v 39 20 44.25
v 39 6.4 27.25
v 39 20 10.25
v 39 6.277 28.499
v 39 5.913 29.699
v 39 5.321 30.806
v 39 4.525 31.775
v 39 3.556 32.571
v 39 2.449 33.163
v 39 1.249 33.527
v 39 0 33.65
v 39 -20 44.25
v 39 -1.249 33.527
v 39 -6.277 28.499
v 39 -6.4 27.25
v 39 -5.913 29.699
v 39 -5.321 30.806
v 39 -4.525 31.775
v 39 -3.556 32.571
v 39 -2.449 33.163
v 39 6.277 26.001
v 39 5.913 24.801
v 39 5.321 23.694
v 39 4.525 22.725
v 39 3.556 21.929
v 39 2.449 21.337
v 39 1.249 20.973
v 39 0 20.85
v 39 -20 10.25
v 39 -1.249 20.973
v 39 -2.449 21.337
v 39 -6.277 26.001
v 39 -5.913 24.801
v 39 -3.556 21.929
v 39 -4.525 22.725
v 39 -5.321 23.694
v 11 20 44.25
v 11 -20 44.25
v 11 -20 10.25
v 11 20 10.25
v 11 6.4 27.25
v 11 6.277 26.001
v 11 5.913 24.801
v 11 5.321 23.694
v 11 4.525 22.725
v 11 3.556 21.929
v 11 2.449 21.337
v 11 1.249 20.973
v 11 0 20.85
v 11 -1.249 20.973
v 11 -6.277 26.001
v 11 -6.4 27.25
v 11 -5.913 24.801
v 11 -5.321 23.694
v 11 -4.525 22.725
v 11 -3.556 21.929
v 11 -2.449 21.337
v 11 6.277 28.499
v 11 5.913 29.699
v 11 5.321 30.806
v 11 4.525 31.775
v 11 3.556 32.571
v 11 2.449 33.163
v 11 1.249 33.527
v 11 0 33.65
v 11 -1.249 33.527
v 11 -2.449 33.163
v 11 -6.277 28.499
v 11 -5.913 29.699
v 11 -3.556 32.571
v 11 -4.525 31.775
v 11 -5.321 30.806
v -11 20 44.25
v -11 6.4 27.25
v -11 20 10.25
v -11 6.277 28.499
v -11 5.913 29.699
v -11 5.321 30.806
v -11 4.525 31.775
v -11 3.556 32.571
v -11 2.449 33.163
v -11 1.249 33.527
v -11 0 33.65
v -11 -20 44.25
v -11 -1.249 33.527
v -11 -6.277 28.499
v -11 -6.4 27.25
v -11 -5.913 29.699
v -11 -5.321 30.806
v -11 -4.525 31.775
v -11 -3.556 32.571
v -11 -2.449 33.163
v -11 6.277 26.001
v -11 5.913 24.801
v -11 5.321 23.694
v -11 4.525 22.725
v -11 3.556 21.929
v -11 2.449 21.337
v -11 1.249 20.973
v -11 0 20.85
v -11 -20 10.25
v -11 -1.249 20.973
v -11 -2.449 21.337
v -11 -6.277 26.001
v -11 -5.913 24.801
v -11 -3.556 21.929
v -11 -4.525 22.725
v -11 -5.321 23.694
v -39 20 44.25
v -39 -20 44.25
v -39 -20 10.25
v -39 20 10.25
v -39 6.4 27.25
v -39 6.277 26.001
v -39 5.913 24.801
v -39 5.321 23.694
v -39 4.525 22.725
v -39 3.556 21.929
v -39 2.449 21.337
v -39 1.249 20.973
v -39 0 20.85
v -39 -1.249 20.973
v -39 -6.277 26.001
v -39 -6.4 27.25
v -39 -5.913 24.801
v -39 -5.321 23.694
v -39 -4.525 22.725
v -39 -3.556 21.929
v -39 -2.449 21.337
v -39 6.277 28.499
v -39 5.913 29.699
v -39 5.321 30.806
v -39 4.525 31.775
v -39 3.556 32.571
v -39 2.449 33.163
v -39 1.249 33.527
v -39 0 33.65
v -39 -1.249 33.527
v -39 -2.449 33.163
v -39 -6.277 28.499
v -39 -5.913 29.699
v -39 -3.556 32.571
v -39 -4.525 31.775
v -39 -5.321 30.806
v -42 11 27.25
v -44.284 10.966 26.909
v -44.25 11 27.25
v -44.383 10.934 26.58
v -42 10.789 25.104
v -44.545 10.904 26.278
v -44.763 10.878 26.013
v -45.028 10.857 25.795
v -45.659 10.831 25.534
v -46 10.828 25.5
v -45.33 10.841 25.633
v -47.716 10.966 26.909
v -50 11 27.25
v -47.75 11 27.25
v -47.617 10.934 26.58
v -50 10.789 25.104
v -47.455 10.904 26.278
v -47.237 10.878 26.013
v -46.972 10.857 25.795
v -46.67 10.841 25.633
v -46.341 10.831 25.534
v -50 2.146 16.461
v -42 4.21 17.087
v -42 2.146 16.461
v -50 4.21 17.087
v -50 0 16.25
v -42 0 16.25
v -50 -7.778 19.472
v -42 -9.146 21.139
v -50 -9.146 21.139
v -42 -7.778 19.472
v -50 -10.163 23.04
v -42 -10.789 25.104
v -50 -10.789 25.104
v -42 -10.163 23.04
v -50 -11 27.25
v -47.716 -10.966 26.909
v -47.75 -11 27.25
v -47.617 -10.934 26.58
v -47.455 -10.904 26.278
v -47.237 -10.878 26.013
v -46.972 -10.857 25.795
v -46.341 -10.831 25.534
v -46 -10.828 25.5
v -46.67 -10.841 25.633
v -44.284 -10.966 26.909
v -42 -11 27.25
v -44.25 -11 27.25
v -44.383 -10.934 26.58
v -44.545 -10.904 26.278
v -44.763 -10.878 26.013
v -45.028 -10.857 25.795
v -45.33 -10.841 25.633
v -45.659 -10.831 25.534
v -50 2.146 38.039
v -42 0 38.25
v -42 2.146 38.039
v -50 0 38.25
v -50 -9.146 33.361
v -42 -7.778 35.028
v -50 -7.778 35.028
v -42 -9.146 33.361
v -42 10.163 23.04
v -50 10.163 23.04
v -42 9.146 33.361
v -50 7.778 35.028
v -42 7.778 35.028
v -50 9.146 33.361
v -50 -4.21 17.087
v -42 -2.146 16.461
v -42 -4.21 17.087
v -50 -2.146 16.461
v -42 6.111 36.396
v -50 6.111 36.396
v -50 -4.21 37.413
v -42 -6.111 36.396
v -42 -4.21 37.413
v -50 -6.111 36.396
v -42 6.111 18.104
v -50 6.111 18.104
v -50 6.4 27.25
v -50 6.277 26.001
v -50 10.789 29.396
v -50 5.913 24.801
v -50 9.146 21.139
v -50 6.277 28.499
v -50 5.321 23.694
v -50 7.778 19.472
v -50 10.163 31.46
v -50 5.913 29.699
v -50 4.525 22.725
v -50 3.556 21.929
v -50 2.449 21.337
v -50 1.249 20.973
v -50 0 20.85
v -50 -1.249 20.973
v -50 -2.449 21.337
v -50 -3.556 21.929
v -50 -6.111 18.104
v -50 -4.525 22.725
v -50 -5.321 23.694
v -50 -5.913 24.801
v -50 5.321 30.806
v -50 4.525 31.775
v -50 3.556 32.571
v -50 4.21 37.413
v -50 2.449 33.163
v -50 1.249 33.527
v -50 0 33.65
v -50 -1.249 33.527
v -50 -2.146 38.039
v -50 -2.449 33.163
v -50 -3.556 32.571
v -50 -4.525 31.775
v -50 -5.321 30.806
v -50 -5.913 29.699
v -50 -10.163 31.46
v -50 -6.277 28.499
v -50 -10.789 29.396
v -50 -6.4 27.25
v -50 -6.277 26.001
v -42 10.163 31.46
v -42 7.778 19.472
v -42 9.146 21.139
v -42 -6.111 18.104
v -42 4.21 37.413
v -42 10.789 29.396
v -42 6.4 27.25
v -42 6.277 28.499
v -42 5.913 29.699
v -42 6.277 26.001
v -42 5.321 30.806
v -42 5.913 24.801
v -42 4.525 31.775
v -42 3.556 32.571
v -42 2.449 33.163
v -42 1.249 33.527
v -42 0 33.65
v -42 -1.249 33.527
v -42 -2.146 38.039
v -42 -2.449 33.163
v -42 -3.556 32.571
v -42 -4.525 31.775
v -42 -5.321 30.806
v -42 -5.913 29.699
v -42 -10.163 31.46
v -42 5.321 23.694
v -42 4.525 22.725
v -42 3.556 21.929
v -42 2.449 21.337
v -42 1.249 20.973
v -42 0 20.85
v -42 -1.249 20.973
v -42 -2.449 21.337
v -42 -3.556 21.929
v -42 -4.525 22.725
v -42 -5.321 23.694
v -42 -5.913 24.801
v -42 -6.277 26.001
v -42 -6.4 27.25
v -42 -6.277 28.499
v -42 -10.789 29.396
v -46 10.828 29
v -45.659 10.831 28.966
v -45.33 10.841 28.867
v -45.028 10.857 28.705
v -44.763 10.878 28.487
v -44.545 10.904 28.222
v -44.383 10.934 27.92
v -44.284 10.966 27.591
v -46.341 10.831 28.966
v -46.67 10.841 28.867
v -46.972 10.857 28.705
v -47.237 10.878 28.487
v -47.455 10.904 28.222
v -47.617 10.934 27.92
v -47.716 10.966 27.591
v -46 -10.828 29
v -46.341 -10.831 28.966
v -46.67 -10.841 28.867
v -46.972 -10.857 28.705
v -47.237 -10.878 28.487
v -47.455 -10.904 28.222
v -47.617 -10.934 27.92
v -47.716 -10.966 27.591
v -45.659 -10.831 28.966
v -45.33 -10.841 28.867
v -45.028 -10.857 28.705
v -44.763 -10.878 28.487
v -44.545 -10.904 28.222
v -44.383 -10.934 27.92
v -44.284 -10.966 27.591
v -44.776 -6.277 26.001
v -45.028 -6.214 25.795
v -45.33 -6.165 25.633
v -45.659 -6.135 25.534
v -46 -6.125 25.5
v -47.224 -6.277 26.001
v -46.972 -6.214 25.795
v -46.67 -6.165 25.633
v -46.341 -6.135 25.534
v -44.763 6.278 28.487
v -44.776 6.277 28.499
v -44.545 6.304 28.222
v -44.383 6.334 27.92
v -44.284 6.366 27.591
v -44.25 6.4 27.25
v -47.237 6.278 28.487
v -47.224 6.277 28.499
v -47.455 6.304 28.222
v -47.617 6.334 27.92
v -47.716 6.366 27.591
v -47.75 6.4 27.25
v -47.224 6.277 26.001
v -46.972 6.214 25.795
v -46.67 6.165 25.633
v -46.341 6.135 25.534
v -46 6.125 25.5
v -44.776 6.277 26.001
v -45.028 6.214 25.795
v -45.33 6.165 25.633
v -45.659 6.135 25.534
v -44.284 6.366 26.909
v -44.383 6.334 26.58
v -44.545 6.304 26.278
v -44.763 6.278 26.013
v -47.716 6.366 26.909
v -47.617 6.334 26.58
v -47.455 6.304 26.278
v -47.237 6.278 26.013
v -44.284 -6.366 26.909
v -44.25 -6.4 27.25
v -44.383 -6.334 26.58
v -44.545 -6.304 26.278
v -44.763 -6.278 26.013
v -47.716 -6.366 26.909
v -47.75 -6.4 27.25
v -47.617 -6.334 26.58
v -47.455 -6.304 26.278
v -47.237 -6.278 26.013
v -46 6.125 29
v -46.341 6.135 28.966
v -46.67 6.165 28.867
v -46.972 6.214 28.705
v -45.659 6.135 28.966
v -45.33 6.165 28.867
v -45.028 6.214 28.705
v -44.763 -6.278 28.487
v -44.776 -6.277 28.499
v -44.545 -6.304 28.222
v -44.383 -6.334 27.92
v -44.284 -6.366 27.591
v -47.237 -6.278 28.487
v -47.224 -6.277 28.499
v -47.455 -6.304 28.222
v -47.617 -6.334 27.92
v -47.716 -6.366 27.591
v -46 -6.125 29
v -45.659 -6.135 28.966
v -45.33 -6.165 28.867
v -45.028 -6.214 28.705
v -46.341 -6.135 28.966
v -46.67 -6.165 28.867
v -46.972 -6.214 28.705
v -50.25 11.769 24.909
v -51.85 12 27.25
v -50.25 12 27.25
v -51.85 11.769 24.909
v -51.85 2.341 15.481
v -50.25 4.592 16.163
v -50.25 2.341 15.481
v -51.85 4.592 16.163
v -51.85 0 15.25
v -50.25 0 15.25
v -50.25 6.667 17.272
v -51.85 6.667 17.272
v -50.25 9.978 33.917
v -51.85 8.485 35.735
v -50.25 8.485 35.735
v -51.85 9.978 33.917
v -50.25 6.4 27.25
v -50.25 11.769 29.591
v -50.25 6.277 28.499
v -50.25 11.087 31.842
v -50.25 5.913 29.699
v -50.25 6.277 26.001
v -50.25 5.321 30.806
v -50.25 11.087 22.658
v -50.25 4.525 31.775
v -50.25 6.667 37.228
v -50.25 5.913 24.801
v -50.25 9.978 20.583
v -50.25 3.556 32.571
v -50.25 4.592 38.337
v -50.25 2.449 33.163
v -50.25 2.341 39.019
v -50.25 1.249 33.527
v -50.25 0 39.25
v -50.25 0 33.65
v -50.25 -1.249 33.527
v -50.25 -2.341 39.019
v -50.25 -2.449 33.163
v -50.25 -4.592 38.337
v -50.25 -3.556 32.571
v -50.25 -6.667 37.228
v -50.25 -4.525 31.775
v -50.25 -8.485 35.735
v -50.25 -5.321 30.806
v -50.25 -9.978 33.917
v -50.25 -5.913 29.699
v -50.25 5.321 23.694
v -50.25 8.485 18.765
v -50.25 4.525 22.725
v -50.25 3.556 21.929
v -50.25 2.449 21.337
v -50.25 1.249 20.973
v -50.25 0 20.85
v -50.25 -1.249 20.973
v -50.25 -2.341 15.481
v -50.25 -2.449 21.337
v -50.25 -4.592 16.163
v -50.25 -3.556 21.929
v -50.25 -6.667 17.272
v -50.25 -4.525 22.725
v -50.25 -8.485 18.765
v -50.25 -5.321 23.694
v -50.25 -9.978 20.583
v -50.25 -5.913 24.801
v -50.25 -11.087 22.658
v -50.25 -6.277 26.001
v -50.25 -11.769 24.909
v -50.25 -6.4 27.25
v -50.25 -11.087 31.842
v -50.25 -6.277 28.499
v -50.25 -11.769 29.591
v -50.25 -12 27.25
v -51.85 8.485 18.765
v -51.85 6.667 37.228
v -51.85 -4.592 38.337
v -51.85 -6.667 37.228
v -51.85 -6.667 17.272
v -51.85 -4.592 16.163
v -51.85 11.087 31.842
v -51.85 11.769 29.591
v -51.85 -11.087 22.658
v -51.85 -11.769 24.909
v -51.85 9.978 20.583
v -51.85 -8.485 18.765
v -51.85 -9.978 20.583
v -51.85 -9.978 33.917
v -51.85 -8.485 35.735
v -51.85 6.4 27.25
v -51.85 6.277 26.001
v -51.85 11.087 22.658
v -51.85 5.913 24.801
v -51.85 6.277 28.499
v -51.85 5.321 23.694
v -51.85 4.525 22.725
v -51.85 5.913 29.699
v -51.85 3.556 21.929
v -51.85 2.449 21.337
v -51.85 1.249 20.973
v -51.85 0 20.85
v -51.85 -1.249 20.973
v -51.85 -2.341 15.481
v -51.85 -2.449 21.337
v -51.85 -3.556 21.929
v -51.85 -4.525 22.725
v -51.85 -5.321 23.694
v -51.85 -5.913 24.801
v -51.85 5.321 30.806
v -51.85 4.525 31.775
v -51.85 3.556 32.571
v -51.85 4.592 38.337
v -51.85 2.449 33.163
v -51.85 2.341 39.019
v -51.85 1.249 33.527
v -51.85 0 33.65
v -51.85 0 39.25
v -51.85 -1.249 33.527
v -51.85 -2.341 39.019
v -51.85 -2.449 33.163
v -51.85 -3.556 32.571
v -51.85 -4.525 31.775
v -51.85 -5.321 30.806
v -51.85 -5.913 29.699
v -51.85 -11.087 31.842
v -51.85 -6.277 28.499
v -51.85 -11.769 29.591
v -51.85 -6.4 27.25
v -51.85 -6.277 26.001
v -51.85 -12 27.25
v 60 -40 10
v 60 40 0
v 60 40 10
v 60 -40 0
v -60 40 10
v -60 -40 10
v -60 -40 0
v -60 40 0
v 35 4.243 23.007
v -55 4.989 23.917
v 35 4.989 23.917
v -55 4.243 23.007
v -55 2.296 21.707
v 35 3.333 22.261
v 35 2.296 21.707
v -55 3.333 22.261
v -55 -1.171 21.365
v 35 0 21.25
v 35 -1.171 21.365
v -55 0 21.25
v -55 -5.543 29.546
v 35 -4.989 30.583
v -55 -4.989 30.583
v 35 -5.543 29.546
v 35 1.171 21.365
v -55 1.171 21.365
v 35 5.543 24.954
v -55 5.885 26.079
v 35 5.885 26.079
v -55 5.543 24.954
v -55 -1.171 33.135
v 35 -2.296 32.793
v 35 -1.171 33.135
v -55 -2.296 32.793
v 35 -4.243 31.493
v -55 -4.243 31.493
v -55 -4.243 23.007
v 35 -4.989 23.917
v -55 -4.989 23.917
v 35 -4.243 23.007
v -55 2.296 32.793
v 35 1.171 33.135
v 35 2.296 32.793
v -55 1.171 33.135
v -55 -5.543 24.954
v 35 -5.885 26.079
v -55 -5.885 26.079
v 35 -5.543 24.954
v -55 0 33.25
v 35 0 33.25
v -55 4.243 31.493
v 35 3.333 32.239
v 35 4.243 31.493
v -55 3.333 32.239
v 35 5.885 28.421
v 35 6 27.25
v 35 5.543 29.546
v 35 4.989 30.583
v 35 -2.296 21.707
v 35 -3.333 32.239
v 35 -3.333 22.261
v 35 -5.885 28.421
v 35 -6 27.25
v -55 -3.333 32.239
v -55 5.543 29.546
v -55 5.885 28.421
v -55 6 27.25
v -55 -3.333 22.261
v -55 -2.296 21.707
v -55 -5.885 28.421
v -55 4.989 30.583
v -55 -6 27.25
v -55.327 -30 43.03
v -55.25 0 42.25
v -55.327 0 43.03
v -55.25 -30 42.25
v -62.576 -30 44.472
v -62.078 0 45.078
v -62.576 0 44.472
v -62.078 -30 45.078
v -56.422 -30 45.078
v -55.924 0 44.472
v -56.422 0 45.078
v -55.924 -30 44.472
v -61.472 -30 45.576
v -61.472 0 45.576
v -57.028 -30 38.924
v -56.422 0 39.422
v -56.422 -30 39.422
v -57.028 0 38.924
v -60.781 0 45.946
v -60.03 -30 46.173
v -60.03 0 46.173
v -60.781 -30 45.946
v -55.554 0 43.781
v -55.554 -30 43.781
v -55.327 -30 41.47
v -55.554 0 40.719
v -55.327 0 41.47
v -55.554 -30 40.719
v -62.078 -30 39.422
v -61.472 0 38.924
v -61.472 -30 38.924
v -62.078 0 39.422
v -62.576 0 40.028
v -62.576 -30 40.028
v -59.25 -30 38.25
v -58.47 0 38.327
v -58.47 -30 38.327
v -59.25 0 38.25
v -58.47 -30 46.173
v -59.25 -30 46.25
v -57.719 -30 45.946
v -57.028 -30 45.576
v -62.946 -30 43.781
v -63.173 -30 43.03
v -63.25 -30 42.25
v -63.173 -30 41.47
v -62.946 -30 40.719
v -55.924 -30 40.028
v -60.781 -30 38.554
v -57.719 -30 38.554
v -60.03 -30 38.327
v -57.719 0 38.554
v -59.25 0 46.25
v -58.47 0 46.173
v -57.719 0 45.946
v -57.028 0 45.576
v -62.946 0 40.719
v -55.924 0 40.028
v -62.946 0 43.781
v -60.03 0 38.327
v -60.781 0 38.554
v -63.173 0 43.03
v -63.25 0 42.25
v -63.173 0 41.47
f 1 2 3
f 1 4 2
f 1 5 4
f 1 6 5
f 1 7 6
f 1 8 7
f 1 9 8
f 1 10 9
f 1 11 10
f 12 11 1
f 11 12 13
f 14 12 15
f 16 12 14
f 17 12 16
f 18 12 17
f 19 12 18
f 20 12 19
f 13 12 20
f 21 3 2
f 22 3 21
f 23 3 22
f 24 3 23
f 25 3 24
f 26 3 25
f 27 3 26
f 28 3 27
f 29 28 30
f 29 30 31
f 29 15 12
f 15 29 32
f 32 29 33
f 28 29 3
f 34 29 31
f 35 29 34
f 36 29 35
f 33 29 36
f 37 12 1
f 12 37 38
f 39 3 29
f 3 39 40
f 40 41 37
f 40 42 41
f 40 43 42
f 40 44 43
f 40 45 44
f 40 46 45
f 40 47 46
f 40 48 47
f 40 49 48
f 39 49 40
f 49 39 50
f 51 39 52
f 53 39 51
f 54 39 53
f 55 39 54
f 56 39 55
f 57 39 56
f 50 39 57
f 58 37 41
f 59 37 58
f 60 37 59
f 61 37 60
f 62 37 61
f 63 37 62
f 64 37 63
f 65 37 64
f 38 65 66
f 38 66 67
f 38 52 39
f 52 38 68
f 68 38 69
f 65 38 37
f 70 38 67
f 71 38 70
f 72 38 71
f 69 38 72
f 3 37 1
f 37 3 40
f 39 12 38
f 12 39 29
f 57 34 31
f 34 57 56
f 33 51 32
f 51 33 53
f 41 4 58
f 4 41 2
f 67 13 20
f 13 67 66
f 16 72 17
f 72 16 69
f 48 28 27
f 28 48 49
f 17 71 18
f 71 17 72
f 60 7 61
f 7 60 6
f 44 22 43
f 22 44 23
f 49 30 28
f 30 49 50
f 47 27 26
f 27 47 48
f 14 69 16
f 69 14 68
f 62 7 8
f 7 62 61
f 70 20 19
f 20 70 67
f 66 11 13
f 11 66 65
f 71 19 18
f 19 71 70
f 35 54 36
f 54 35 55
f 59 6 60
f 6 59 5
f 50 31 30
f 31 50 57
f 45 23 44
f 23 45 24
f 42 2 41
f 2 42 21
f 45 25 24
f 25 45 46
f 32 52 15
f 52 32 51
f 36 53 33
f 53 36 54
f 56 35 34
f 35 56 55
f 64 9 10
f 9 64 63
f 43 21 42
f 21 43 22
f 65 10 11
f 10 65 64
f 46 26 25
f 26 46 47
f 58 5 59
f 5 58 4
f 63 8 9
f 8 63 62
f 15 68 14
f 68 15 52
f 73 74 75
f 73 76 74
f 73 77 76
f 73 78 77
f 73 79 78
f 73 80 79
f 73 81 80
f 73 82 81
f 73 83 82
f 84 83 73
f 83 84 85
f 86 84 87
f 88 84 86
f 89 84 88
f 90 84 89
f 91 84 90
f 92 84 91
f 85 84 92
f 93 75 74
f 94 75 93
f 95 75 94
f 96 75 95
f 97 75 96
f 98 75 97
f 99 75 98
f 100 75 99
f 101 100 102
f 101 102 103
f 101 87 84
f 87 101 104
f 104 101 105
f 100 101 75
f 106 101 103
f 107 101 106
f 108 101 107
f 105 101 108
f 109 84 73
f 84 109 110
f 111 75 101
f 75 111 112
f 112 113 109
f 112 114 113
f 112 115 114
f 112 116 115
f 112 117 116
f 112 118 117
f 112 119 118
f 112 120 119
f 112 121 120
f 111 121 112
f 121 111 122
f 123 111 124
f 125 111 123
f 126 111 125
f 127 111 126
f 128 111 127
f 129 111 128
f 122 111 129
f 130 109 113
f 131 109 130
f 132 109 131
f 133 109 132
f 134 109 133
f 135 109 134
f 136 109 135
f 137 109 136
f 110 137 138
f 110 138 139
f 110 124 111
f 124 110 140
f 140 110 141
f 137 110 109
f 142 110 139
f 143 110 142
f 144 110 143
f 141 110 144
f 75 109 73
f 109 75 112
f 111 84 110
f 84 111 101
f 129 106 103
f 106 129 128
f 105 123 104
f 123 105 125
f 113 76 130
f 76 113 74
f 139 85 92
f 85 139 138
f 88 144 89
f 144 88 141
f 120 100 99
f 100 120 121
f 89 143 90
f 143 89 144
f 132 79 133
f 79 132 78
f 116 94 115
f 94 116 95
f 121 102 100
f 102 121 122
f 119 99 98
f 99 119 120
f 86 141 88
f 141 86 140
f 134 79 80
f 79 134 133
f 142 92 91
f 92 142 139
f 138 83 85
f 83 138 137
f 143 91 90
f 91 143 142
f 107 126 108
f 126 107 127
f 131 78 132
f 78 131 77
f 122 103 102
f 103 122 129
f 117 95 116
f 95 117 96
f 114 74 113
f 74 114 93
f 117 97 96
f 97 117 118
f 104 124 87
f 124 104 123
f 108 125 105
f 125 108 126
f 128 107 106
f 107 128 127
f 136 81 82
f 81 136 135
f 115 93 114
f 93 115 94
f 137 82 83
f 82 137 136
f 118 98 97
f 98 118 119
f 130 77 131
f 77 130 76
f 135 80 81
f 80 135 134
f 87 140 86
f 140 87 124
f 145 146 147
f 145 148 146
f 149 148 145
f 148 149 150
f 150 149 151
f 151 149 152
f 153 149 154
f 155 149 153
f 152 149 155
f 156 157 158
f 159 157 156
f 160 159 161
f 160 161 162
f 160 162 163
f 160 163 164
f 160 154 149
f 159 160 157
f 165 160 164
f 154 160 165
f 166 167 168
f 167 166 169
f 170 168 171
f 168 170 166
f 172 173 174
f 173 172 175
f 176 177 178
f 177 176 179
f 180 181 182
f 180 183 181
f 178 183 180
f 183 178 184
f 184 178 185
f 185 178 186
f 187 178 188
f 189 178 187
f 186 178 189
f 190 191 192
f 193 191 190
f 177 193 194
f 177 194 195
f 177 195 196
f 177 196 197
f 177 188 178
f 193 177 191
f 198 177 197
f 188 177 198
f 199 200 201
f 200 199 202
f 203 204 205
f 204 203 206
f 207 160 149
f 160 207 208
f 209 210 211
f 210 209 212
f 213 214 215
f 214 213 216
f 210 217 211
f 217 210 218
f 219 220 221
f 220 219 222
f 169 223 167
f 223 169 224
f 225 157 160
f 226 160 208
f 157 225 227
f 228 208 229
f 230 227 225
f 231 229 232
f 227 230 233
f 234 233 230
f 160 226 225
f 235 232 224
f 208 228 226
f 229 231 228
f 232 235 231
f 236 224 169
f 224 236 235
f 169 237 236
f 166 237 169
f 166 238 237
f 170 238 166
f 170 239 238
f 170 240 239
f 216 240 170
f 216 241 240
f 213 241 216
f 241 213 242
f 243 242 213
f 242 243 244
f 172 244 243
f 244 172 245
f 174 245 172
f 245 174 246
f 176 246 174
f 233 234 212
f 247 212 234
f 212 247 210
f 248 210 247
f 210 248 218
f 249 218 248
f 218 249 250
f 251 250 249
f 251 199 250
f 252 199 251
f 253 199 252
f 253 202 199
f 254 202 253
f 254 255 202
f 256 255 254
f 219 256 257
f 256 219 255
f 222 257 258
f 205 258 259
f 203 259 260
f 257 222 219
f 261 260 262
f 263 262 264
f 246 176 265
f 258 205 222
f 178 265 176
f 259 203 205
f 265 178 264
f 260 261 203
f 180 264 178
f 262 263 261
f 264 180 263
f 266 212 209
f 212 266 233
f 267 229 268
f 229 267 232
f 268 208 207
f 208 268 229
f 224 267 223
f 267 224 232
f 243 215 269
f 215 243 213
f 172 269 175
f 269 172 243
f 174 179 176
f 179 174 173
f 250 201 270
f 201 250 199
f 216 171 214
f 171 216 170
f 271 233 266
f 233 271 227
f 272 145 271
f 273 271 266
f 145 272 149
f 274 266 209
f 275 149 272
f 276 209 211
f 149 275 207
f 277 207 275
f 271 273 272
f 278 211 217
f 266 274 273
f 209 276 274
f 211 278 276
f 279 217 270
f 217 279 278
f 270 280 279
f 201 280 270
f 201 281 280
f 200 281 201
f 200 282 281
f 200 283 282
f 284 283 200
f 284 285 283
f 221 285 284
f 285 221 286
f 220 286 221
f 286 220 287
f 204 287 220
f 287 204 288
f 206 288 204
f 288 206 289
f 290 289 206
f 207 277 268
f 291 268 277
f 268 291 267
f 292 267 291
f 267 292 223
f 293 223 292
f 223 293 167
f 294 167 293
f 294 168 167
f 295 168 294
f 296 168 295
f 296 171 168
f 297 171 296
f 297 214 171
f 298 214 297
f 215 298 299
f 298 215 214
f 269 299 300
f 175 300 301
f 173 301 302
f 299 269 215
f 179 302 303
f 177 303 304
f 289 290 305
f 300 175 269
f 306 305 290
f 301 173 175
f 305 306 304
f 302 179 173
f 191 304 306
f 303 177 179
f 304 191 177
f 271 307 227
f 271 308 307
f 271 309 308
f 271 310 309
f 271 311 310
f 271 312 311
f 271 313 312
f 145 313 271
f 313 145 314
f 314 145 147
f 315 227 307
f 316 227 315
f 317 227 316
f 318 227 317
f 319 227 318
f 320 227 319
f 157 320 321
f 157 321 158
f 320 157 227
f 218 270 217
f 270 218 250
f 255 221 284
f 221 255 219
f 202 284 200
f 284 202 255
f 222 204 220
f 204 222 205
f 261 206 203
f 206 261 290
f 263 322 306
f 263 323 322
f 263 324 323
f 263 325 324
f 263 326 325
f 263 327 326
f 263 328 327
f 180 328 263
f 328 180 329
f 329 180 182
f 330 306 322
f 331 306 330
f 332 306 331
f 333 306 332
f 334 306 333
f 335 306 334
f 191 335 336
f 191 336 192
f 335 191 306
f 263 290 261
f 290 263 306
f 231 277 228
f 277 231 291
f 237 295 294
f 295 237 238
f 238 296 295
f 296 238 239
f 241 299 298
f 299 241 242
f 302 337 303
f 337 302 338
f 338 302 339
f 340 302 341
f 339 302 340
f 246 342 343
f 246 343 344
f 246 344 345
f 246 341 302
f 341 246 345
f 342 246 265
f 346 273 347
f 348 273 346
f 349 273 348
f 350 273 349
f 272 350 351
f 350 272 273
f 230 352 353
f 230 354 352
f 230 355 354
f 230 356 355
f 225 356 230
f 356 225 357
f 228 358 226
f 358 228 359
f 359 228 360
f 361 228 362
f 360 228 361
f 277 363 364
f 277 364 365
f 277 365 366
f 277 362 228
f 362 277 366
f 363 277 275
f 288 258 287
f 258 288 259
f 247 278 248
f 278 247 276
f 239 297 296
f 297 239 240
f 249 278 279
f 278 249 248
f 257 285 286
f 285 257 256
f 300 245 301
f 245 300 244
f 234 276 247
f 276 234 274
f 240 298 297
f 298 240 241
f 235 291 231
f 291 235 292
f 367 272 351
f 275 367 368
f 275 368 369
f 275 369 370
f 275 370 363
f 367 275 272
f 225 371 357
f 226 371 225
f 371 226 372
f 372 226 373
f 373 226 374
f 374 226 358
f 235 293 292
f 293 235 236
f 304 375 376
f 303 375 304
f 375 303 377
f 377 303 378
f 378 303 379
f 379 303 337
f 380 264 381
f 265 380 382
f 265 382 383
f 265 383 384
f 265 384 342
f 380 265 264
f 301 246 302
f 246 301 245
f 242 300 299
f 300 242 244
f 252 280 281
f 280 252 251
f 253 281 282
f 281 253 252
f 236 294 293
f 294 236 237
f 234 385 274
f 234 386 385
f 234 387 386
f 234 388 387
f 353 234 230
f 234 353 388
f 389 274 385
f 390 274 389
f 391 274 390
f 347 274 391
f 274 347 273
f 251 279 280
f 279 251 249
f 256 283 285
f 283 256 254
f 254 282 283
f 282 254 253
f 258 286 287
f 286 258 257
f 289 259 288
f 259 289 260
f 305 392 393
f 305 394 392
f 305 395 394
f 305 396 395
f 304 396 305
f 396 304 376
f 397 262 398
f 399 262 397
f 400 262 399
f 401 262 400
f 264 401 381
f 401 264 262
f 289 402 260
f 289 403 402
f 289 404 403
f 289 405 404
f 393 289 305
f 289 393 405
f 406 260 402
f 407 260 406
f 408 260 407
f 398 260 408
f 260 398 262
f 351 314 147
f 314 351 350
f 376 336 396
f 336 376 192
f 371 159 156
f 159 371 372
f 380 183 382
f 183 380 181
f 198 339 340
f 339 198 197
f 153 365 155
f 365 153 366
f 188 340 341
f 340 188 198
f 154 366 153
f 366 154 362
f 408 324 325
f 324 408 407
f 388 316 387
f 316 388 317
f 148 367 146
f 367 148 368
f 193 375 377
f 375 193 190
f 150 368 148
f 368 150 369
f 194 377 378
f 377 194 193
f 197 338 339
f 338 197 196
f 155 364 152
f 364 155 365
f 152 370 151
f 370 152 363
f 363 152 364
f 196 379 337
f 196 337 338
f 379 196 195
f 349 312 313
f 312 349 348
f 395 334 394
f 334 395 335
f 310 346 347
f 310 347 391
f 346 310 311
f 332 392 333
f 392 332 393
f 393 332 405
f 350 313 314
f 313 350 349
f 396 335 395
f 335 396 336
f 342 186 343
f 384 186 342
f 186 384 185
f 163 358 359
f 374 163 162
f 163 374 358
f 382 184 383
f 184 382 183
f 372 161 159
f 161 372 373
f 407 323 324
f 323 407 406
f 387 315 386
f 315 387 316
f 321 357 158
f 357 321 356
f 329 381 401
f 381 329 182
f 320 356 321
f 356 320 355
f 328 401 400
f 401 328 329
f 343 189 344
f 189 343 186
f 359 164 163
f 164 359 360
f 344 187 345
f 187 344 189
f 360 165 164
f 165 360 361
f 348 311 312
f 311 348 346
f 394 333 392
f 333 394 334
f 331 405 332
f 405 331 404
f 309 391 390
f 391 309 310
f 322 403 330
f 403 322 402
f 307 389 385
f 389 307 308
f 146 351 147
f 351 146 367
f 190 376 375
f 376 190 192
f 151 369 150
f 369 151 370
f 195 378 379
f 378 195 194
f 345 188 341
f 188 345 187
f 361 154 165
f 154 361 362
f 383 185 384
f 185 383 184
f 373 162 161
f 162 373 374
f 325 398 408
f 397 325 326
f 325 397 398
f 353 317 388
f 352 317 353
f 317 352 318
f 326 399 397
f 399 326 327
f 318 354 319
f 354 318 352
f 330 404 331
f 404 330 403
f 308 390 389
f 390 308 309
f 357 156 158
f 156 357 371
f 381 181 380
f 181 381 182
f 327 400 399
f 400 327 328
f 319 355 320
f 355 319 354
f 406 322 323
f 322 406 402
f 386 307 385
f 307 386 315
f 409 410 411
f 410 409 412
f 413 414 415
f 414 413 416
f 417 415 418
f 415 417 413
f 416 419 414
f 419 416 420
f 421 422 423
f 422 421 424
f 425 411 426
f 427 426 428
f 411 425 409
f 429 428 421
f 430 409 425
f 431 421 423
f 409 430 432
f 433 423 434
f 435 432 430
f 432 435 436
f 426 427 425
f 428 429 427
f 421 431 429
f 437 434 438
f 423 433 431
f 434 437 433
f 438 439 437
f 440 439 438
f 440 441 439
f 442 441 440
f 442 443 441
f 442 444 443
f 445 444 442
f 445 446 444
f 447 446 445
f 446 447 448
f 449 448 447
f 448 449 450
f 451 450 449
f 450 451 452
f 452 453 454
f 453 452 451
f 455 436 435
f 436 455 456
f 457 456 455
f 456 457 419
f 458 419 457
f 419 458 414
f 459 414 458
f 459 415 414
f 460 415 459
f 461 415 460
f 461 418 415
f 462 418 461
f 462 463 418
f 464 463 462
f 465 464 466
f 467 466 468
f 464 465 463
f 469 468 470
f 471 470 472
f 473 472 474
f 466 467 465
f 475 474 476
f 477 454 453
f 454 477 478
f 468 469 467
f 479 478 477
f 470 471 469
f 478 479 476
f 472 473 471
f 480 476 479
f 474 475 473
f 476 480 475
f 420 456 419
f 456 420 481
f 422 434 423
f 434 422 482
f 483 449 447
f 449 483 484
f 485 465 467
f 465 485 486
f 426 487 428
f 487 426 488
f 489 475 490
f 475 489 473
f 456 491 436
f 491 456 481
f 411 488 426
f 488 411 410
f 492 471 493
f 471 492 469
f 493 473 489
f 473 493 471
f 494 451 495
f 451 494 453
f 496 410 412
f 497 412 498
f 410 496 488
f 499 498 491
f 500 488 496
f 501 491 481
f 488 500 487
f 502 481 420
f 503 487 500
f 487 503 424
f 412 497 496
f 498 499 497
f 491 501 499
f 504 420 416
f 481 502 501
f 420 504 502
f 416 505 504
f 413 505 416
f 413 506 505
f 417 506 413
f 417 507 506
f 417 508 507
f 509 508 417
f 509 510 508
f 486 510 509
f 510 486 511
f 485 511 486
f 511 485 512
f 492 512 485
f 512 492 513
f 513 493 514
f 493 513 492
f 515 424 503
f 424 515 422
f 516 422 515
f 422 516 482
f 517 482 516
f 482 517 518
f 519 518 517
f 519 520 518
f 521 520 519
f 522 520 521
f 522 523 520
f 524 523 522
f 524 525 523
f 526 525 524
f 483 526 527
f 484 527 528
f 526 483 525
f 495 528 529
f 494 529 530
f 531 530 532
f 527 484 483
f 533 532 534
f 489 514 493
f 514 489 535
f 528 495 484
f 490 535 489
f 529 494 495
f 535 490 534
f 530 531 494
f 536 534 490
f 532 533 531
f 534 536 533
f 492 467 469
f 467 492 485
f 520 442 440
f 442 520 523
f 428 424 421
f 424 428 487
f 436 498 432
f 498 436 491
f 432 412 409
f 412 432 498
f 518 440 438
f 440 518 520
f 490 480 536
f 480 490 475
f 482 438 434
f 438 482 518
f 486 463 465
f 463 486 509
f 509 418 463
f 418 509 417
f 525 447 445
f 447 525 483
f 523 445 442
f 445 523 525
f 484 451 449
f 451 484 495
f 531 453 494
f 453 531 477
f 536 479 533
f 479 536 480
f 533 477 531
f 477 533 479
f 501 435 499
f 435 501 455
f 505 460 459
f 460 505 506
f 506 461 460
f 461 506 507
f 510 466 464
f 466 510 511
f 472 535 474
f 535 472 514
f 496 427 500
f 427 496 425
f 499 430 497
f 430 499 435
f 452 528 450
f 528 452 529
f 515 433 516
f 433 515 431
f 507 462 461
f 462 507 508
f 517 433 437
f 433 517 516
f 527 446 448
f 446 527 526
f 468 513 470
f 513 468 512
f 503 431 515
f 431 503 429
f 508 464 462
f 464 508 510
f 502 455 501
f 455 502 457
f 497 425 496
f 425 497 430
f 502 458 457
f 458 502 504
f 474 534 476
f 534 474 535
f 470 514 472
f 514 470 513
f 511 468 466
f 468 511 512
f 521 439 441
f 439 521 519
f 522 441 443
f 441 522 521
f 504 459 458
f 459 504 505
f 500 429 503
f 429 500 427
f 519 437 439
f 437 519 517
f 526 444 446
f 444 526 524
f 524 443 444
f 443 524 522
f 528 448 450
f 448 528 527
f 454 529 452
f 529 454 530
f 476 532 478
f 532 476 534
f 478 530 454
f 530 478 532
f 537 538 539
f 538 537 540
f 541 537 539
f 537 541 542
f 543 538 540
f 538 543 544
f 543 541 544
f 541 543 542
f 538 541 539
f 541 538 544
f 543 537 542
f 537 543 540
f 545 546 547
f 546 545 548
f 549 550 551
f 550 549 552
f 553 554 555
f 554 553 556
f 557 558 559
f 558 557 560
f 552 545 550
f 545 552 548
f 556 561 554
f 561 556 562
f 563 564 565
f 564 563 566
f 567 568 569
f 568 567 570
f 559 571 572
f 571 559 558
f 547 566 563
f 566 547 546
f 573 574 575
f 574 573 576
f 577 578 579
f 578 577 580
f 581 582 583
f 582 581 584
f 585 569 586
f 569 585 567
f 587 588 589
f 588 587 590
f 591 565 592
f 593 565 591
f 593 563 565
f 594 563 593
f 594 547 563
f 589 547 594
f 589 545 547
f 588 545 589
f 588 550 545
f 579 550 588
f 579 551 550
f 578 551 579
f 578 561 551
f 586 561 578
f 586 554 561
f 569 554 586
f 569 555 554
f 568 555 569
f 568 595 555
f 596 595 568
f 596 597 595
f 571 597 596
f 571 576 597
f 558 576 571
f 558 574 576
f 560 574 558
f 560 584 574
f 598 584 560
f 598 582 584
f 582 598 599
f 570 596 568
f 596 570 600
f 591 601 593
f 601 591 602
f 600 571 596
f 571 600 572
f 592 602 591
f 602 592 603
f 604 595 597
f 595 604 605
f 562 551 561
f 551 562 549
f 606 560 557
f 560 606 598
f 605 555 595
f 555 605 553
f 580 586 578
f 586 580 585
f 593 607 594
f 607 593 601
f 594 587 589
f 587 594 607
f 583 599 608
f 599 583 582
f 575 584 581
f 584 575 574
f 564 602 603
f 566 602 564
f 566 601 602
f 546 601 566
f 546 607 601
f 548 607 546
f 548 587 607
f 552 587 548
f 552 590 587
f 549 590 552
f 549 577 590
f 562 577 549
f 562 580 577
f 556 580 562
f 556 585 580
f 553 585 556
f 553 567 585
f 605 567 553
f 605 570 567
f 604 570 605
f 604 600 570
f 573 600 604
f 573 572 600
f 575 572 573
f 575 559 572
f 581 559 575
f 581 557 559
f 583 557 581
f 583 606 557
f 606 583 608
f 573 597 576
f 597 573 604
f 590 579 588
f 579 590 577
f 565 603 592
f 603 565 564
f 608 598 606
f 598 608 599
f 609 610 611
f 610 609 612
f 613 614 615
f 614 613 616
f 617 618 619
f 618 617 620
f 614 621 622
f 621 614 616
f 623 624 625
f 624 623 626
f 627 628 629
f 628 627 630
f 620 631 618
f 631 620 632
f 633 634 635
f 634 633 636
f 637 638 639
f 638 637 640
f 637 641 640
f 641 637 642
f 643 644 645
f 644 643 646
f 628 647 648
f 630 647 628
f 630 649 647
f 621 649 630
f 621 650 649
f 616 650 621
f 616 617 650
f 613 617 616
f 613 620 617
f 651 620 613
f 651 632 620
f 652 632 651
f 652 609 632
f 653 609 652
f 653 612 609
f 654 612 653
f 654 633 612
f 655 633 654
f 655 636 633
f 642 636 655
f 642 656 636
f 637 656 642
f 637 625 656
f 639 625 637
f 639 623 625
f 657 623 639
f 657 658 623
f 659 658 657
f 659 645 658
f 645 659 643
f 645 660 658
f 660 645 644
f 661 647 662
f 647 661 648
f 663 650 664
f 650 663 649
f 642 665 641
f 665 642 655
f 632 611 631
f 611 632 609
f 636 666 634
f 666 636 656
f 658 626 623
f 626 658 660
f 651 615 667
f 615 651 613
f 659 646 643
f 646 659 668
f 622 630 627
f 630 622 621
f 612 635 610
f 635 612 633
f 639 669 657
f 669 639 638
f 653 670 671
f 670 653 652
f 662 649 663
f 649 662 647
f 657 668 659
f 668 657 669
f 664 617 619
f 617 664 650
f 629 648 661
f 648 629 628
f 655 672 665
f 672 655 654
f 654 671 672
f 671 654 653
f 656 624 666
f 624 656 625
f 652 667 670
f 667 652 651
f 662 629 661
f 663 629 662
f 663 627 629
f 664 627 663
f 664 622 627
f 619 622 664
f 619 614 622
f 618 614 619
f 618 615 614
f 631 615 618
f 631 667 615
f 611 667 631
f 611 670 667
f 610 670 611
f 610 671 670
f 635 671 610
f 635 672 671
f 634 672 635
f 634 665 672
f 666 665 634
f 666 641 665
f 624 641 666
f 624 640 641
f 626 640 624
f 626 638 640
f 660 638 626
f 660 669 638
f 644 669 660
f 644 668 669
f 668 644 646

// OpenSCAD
$fn = 32;

// ------------------------------------------------------------------------
// Machine vise: screw d12, jaws 28 x 34 mm
// Every part is its own module, assembly() places every instance.
// ------------------------------------------------------------------------

// --- part 1 ---
module vise_bed() {
  difference() {
    translate([-60, -40, 0]) cube([120, 80, 10]);
  }
}

// --- part 2 ---
module vise_jaw() {
  difference() {
    translate([-14, -20, 0]) cube([28, 40, 34]);
    translate([0, 0, 17]) rotate([0, 90, 0]) cylinder(h = 30, d = 12.8, center = true);
  }
}

// --- part 3 ---
module vise_screw() {
  translate([0, 0, -45]) cylinder(h = 90, d = 12);
}

// --- part 4 ---
module screw_collar() {
  difference() {
    cylinder(h = 8, d = 22);
    translate([0, 0, -1]) cylinder(h = 10, d = 12.8);
    translate([0, 0, 4]) rotate([90, 0, 0]) cylinder(h = 24, d = 3.5, center = true);
  }
}

// --- part 5 ---
module screw_washer() {
  difference() {
      translate([0, 0, 0]) cylinder(h = 1.6, d = 24);
      translate([0, 0, -1]) cylinder(h = 3.6, d = 12.8);
    }
}

// --- part 6 ---
module vise_handle() {
  cylinder(h = 30, d = 8);
}

// --- assembly ---
module assembly() {
  color([0.80, 0.24, 0.20]) translate([0, 0, 0]) rotate([0, 0, 0]) vise_bed();
  color([0.20, 0.45, 0.75]) translate([25, 0, 10.25]) rotate([0, 0, 0]) vise_jaw();
  color([0.25, 0.62, 0.32]) translate([-25, 0, 10.25]) rotate([0, 0, 0]) vise_jaw();
  color([0.92, 0.70, 0.18]) translate([-10, 0, 27.25]) rotate([0, 90, 0]) vise_screw();
  color([0.58, 0.35, 0.70]) translate([-50, 0, 27.25]) rotate([0, 90, 0]) screw_collar();
  color([0.16, 0.66, 0.66]) translate([-51.85, 0, 27.25]) rotate([0, 90, 0]) screw_washer();
  color([0.85, 0.48, 0.18]) translate([-59.25, 0, 42.25]) rotate([90, 0, 0]) vise_handle();
}

assembly();
